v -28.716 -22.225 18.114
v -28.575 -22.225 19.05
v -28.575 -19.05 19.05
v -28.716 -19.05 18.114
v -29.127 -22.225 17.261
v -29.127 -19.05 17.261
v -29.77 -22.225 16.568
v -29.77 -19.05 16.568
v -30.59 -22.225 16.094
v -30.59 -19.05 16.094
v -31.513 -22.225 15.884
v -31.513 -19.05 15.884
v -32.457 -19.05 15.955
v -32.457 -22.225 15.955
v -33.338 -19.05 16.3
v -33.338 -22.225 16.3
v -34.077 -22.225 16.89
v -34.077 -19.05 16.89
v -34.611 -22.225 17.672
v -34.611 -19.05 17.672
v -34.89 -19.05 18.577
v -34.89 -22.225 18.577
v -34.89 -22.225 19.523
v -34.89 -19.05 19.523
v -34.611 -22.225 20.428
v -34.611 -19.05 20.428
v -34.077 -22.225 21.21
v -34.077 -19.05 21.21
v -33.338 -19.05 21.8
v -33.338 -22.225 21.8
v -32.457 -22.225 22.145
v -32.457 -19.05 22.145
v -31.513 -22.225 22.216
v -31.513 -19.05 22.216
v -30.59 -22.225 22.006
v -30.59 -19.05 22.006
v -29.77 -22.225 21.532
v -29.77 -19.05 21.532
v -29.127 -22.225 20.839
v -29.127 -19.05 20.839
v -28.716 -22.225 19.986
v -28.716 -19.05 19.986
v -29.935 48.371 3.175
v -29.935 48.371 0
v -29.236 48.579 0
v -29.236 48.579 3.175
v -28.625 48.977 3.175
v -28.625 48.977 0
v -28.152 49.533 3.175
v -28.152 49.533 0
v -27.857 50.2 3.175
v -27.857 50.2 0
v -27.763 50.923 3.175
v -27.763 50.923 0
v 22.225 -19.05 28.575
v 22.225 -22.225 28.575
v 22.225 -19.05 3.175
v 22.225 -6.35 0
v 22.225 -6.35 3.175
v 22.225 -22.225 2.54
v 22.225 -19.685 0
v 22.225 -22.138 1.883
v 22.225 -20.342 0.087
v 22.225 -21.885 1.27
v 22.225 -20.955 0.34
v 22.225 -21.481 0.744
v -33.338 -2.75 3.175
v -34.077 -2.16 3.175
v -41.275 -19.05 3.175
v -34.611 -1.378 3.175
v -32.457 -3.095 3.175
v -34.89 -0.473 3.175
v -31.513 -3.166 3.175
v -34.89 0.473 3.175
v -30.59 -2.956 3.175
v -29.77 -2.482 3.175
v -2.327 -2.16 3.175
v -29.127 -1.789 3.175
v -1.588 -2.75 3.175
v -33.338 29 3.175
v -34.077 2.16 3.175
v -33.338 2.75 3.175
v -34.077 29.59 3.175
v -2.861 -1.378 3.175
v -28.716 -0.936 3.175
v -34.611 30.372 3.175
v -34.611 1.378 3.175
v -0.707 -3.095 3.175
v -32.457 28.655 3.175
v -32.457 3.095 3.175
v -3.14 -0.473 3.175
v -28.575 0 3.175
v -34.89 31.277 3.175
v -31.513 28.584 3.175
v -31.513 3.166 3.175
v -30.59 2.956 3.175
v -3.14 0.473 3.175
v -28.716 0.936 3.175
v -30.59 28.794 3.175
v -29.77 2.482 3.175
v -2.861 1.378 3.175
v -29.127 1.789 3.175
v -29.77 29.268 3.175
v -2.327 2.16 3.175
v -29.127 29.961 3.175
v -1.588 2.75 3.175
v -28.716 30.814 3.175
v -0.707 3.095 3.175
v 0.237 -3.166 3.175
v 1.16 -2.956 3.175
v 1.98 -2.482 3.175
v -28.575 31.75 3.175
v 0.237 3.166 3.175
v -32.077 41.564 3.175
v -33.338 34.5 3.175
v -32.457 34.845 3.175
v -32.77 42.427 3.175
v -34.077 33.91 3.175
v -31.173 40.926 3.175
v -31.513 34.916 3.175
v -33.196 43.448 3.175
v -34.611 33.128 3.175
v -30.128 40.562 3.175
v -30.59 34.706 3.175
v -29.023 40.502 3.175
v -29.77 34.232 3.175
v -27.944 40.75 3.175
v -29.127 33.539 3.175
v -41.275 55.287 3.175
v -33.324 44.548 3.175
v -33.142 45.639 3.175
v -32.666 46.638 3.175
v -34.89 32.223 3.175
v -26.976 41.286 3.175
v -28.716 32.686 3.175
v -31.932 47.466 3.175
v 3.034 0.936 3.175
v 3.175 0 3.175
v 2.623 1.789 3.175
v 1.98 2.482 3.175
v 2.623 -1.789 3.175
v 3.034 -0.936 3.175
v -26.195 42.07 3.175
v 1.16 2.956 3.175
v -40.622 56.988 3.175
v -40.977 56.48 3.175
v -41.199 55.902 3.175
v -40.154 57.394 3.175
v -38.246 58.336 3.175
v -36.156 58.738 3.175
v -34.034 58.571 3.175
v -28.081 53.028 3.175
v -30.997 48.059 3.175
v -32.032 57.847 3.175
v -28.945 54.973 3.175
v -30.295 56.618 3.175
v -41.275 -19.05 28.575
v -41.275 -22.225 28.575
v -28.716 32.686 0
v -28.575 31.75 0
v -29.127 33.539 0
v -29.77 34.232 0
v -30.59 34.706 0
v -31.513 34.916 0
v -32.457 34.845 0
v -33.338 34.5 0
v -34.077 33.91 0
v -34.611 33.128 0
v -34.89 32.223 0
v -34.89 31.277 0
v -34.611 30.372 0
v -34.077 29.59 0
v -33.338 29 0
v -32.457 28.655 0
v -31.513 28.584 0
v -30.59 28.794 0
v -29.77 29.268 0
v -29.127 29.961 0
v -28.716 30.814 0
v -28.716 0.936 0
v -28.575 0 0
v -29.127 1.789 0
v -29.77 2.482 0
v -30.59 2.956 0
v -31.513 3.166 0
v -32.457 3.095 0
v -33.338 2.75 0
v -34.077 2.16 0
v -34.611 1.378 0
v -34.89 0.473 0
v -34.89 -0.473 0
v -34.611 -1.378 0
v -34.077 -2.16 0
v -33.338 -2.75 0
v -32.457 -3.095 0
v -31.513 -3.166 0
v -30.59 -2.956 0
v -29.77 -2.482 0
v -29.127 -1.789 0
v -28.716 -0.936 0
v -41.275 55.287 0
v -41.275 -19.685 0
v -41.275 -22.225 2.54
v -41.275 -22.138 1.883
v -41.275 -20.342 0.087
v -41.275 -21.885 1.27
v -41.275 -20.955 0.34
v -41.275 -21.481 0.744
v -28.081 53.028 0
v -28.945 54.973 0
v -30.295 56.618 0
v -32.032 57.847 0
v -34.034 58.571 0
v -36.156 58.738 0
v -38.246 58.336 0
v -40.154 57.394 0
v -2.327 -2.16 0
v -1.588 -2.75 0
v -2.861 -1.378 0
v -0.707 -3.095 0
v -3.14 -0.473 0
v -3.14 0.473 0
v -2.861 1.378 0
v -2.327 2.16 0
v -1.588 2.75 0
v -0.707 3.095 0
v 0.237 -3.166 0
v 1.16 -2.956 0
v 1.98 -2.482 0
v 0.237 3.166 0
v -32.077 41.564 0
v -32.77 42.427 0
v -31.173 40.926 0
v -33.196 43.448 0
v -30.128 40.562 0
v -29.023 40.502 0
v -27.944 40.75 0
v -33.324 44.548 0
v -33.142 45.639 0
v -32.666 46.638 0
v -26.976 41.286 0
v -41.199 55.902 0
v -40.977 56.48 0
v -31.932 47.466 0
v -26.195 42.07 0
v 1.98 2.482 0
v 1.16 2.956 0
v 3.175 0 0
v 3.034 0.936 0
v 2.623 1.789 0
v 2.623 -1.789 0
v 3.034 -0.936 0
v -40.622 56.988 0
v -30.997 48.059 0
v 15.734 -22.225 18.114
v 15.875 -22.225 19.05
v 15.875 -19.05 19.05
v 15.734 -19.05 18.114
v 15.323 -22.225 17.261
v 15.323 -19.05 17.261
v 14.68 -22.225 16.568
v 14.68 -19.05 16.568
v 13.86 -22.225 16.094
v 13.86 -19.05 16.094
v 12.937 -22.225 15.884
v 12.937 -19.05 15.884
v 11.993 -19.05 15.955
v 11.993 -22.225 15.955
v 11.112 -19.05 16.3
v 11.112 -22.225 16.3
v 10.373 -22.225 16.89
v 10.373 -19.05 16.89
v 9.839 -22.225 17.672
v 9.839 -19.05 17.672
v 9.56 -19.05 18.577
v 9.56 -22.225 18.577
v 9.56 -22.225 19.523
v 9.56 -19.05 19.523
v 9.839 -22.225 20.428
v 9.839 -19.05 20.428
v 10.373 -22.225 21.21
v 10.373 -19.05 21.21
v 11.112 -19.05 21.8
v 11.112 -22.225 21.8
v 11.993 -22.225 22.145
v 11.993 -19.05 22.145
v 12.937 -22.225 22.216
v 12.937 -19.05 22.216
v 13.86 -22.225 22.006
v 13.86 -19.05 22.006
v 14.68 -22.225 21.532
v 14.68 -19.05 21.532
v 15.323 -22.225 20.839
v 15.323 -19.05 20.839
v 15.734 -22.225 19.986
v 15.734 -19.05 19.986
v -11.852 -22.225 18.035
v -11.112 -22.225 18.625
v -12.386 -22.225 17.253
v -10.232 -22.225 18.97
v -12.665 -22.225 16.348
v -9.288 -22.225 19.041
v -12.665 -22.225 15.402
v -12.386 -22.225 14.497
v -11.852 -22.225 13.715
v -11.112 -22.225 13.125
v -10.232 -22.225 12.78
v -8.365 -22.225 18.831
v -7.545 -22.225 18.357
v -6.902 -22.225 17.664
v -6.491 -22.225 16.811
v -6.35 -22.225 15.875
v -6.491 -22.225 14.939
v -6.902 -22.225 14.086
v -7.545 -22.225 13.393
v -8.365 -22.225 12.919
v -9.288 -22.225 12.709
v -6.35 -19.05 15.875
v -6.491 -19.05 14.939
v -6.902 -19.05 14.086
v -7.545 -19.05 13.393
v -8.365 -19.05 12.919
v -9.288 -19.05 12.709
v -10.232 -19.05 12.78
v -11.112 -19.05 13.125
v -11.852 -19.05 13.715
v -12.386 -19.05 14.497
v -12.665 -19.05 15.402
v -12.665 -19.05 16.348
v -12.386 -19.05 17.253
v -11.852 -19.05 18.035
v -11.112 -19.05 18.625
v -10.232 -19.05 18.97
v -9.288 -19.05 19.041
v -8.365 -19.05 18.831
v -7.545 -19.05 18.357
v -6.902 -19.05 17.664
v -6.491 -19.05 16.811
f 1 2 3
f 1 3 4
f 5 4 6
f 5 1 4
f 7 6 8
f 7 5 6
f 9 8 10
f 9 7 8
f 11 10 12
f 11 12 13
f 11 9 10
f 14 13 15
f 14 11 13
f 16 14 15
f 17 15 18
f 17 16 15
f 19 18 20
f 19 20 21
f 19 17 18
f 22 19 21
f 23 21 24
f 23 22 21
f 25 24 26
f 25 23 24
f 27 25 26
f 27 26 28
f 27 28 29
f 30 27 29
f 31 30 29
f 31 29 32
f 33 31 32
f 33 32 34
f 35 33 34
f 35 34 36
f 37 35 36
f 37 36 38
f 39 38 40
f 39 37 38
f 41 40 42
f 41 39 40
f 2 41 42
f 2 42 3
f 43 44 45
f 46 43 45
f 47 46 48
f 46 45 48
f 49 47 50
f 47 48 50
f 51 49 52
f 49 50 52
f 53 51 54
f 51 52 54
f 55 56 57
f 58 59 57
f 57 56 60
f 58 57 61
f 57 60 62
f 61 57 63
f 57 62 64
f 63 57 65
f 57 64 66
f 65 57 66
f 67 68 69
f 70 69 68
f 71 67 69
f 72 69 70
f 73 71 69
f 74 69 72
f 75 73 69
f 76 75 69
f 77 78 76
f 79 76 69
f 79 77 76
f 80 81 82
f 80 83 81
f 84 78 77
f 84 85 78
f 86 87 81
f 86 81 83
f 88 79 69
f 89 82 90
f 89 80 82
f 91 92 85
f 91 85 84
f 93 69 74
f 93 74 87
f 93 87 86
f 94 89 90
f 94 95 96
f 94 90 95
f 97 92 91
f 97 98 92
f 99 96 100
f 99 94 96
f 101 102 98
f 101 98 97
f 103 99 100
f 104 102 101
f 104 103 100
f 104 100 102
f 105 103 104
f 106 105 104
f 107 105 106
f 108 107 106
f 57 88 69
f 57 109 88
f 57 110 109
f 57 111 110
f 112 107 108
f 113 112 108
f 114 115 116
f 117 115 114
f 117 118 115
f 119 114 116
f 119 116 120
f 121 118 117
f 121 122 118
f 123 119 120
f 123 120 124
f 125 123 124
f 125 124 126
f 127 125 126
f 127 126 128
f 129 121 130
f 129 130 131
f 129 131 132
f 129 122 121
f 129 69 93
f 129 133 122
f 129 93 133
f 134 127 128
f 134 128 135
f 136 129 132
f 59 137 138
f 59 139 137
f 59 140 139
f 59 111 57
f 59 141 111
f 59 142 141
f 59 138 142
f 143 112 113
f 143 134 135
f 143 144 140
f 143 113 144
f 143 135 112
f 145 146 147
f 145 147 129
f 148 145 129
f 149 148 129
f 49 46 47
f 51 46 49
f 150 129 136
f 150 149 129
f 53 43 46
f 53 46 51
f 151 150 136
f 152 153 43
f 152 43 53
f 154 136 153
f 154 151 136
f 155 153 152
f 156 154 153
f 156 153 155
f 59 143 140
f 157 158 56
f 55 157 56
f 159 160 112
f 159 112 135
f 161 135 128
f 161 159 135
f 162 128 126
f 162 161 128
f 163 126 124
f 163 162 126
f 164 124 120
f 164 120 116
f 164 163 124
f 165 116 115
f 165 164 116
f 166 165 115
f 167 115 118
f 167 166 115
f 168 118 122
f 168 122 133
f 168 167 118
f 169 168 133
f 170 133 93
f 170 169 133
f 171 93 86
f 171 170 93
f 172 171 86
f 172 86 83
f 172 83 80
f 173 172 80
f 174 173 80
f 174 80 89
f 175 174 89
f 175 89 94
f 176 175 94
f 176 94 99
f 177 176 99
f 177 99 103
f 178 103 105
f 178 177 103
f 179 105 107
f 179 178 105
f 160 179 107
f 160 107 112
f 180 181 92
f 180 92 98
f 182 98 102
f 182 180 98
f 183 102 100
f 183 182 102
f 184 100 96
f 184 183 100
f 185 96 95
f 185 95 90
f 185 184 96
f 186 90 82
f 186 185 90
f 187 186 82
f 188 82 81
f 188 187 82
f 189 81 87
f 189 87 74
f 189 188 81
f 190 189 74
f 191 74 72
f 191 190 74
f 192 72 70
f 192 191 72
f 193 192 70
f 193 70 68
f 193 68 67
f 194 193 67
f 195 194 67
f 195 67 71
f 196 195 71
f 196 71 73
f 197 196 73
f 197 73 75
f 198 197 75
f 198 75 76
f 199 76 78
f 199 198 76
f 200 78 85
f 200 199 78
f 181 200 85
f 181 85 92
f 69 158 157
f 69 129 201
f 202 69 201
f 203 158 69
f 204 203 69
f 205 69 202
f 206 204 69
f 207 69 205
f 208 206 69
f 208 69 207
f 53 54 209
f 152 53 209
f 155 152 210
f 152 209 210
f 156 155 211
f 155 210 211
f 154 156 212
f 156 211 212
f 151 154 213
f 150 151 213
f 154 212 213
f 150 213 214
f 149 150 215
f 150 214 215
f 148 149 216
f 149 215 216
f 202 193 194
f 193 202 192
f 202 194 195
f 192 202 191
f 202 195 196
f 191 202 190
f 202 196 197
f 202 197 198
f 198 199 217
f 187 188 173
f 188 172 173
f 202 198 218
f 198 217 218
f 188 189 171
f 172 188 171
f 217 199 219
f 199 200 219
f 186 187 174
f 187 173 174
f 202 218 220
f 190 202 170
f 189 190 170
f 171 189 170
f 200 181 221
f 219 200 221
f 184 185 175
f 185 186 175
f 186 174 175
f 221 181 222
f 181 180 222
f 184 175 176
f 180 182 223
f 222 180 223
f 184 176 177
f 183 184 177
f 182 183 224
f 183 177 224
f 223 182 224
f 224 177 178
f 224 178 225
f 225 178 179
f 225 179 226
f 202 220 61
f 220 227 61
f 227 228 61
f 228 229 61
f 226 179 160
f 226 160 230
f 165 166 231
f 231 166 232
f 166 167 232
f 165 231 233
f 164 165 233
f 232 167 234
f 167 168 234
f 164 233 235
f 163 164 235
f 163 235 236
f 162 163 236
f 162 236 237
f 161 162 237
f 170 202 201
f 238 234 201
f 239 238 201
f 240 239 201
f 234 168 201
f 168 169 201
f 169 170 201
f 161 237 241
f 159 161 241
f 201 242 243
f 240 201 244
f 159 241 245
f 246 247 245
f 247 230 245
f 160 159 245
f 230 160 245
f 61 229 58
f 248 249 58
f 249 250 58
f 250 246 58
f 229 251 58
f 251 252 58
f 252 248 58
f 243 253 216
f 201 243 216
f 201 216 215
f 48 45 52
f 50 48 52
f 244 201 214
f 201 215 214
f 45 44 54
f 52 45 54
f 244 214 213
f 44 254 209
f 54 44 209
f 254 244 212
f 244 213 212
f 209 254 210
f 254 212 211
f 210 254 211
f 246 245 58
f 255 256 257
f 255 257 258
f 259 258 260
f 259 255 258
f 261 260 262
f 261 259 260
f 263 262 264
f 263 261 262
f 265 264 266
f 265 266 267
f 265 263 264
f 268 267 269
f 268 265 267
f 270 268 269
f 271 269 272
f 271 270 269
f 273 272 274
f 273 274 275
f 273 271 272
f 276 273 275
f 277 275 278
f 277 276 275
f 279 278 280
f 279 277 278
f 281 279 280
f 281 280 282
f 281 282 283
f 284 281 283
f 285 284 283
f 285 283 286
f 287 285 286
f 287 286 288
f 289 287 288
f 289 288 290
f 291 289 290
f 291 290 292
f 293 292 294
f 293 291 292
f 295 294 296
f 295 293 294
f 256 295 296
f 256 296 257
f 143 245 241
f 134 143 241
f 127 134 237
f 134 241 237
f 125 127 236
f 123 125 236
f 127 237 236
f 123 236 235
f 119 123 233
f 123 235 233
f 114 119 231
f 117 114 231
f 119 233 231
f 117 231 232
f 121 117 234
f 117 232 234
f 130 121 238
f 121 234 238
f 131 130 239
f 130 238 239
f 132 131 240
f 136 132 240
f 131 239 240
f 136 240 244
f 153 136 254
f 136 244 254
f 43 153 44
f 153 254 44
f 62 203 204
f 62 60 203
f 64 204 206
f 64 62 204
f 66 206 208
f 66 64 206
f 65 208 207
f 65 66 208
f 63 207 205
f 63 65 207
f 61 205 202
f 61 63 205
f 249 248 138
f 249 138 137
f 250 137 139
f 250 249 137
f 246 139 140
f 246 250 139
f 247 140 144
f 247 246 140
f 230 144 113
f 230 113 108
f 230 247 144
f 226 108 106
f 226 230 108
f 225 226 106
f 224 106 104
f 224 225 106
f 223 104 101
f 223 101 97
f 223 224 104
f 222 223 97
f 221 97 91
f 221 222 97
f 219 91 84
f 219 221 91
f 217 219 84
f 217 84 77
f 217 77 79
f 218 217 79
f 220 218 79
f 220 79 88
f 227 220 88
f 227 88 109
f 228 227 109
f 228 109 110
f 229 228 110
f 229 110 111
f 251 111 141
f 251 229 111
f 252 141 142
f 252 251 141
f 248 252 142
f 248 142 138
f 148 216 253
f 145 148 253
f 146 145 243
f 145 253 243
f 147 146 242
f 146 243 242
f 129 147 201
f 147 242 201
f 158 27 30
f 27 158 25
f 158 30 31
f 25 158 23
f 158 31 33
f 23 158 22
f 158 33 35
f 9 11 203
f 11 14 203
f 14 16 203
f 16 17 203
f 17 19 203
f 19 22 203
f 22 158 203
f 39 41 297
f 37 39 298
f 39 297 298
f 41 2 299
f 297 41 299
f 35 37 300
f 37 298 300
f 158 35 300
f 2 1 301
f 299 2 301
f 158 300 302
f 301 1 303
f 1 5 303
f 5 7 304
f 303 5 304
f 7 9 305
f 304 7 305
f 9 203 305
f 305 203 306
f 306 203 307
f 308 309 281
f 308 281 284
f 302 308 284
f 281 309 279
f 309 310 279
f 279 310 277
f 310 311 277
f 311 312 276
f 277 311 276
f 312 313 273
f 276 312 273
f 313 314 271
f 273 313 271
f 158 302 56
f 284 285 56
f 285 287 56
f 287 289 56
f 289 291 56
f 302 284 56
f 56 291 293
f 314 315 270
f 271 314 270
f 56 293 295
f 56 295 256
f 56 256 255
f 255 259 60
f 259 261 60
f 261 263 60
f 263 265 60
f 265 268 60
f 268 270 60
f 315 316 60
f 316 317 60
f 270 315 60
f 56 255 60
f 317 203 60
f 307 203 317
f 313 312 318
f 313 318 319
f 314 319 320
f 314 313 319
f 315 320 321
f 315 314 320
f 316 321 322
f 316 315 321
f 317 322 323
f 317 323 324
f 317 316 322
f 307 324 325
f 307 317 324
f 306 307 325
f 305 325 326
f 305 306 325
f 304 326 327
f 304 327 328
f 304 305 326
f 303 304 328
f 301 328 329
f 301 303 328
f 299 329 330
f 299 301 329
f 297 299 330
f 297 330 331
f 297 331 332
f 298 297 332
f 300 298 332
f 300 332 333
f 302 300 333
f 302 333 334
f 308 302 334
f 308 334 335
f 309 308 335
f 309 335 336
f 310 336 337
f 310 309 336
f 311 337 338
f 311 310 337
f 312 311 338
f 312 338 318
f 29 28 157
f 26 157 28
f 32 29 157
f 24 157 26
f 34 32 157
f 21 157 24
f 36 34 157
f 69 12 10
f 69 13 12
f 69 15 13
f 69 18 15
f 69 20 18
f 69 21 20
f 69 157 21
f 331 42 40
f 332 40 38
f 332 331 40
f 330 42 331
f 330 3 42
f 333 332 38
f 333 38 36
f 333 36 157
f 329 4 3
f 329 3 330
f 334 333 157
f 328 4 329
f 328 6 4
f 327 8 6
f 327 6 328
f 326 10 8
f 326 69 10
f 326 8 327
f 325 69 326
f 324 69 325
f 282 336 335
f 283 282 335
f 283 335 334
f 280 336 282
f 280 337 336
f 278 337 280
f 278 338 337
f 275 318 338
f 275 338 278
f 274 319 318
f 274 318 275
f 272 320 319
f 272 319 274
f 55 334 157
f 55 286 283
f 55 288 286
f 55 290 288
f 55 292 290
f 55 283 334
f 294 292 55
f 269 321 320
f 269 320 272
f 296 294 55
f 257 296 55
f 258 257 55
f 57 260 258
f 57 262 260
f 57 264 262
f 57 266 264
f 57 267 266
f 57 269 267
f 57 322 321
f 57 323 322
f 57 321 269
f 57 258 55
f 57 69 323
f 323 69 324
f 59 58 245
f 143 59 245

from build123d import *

# Parameters (mm, degrees)
SKETCH1_R           = 3.175
BOSS_EXTRUDE1_DEPTH = 3.175
SKETCH2_W           = 63.5
SKETCH2_H           = 25.4
SKETCH2_R           = 3.175
BOSS_EXTRUDE2_DEPTH = 3.175
FILLET1_R           = 2.54


with BuildPart() as part:
    # Sketch1 → Boss-Extrude1 (new body)
    with BuildSketch(Plane.XY):
        with BuildLine():
            Line((-41.275, 55.28710968), (-41.275, -22.225))
            Line((-41.275, -22.225), (22.225, -22.225))
            Line((22.225, -22.225), (22.225, -6.35))
            Line((22.225, -6.35), (-26.194658329, 42.069658329))
            ThreePointArc((-26.194658329, 42.069658329), (-32.769591892, 42.42721549), (-29.935488317, 48.370737627))
            ThreePointArc((-29.935488317, 48.370737627), (-28.368460583, 49.237906002), (-27.763159017, 50.923482141))
            ThreePointArc((-27.763159017, 50.923482141), (-32.032478959, 57.847259125), (-40.154061033, 57.393733943))
            ThreePointArc((-40.154061033, 57.393733943), (-40.977321902, 56.480253631), (-41.275, 55.28710968))
        make_face()
        Circle(SKETCH1_R, mode=Mode.SUBTRACT)
        with Locations((-31.75, 0)):
            Circle(SKETCH1_R, mode=Mode.SUBTRACT)
        with Locations((-31.75, 31.75)):
            Circle(SKETCH1_R, mode=Mode.SUBTRACT)
    extrude(amount=BOSS_EXTRUDE1_DEPTH)

    # Sketch2 → Boss-Extrude2 (add)
    with BuildSketch(Plane(origin=(0, -22.225, 0), x_dir=(1, 0, 0), z_dir=(0, 1, 0))):
        with Locations((-9.525, -15.875)):
            Rectangle(SKETCH2_W, SKETCH2_H)
        with Locations((-9.525, -15.875)):
            Circle(SKETCH2_R, mode=Mode.SUBTRACT)
        with Locations((-31.75, -19.05)):
            Circle(SKETCH2_R, mode=Mode.SUBTRACT)
        with Locations((12.7, -19.05)):
            Circle(SKETCH2_R, mode=Mode.SUBTRACT)
    extrude(amount=BOSS_EXTRUDE2_DEPTH)

    # Fillet1
    fillet1_edges = [part.edges().sort_by_distance(p)[0] for p in [
        (-9.525, -22.225, 0),
    ]]
    fillet(fillet1_edges, radius=FILLET1_R)


solid = part.part
